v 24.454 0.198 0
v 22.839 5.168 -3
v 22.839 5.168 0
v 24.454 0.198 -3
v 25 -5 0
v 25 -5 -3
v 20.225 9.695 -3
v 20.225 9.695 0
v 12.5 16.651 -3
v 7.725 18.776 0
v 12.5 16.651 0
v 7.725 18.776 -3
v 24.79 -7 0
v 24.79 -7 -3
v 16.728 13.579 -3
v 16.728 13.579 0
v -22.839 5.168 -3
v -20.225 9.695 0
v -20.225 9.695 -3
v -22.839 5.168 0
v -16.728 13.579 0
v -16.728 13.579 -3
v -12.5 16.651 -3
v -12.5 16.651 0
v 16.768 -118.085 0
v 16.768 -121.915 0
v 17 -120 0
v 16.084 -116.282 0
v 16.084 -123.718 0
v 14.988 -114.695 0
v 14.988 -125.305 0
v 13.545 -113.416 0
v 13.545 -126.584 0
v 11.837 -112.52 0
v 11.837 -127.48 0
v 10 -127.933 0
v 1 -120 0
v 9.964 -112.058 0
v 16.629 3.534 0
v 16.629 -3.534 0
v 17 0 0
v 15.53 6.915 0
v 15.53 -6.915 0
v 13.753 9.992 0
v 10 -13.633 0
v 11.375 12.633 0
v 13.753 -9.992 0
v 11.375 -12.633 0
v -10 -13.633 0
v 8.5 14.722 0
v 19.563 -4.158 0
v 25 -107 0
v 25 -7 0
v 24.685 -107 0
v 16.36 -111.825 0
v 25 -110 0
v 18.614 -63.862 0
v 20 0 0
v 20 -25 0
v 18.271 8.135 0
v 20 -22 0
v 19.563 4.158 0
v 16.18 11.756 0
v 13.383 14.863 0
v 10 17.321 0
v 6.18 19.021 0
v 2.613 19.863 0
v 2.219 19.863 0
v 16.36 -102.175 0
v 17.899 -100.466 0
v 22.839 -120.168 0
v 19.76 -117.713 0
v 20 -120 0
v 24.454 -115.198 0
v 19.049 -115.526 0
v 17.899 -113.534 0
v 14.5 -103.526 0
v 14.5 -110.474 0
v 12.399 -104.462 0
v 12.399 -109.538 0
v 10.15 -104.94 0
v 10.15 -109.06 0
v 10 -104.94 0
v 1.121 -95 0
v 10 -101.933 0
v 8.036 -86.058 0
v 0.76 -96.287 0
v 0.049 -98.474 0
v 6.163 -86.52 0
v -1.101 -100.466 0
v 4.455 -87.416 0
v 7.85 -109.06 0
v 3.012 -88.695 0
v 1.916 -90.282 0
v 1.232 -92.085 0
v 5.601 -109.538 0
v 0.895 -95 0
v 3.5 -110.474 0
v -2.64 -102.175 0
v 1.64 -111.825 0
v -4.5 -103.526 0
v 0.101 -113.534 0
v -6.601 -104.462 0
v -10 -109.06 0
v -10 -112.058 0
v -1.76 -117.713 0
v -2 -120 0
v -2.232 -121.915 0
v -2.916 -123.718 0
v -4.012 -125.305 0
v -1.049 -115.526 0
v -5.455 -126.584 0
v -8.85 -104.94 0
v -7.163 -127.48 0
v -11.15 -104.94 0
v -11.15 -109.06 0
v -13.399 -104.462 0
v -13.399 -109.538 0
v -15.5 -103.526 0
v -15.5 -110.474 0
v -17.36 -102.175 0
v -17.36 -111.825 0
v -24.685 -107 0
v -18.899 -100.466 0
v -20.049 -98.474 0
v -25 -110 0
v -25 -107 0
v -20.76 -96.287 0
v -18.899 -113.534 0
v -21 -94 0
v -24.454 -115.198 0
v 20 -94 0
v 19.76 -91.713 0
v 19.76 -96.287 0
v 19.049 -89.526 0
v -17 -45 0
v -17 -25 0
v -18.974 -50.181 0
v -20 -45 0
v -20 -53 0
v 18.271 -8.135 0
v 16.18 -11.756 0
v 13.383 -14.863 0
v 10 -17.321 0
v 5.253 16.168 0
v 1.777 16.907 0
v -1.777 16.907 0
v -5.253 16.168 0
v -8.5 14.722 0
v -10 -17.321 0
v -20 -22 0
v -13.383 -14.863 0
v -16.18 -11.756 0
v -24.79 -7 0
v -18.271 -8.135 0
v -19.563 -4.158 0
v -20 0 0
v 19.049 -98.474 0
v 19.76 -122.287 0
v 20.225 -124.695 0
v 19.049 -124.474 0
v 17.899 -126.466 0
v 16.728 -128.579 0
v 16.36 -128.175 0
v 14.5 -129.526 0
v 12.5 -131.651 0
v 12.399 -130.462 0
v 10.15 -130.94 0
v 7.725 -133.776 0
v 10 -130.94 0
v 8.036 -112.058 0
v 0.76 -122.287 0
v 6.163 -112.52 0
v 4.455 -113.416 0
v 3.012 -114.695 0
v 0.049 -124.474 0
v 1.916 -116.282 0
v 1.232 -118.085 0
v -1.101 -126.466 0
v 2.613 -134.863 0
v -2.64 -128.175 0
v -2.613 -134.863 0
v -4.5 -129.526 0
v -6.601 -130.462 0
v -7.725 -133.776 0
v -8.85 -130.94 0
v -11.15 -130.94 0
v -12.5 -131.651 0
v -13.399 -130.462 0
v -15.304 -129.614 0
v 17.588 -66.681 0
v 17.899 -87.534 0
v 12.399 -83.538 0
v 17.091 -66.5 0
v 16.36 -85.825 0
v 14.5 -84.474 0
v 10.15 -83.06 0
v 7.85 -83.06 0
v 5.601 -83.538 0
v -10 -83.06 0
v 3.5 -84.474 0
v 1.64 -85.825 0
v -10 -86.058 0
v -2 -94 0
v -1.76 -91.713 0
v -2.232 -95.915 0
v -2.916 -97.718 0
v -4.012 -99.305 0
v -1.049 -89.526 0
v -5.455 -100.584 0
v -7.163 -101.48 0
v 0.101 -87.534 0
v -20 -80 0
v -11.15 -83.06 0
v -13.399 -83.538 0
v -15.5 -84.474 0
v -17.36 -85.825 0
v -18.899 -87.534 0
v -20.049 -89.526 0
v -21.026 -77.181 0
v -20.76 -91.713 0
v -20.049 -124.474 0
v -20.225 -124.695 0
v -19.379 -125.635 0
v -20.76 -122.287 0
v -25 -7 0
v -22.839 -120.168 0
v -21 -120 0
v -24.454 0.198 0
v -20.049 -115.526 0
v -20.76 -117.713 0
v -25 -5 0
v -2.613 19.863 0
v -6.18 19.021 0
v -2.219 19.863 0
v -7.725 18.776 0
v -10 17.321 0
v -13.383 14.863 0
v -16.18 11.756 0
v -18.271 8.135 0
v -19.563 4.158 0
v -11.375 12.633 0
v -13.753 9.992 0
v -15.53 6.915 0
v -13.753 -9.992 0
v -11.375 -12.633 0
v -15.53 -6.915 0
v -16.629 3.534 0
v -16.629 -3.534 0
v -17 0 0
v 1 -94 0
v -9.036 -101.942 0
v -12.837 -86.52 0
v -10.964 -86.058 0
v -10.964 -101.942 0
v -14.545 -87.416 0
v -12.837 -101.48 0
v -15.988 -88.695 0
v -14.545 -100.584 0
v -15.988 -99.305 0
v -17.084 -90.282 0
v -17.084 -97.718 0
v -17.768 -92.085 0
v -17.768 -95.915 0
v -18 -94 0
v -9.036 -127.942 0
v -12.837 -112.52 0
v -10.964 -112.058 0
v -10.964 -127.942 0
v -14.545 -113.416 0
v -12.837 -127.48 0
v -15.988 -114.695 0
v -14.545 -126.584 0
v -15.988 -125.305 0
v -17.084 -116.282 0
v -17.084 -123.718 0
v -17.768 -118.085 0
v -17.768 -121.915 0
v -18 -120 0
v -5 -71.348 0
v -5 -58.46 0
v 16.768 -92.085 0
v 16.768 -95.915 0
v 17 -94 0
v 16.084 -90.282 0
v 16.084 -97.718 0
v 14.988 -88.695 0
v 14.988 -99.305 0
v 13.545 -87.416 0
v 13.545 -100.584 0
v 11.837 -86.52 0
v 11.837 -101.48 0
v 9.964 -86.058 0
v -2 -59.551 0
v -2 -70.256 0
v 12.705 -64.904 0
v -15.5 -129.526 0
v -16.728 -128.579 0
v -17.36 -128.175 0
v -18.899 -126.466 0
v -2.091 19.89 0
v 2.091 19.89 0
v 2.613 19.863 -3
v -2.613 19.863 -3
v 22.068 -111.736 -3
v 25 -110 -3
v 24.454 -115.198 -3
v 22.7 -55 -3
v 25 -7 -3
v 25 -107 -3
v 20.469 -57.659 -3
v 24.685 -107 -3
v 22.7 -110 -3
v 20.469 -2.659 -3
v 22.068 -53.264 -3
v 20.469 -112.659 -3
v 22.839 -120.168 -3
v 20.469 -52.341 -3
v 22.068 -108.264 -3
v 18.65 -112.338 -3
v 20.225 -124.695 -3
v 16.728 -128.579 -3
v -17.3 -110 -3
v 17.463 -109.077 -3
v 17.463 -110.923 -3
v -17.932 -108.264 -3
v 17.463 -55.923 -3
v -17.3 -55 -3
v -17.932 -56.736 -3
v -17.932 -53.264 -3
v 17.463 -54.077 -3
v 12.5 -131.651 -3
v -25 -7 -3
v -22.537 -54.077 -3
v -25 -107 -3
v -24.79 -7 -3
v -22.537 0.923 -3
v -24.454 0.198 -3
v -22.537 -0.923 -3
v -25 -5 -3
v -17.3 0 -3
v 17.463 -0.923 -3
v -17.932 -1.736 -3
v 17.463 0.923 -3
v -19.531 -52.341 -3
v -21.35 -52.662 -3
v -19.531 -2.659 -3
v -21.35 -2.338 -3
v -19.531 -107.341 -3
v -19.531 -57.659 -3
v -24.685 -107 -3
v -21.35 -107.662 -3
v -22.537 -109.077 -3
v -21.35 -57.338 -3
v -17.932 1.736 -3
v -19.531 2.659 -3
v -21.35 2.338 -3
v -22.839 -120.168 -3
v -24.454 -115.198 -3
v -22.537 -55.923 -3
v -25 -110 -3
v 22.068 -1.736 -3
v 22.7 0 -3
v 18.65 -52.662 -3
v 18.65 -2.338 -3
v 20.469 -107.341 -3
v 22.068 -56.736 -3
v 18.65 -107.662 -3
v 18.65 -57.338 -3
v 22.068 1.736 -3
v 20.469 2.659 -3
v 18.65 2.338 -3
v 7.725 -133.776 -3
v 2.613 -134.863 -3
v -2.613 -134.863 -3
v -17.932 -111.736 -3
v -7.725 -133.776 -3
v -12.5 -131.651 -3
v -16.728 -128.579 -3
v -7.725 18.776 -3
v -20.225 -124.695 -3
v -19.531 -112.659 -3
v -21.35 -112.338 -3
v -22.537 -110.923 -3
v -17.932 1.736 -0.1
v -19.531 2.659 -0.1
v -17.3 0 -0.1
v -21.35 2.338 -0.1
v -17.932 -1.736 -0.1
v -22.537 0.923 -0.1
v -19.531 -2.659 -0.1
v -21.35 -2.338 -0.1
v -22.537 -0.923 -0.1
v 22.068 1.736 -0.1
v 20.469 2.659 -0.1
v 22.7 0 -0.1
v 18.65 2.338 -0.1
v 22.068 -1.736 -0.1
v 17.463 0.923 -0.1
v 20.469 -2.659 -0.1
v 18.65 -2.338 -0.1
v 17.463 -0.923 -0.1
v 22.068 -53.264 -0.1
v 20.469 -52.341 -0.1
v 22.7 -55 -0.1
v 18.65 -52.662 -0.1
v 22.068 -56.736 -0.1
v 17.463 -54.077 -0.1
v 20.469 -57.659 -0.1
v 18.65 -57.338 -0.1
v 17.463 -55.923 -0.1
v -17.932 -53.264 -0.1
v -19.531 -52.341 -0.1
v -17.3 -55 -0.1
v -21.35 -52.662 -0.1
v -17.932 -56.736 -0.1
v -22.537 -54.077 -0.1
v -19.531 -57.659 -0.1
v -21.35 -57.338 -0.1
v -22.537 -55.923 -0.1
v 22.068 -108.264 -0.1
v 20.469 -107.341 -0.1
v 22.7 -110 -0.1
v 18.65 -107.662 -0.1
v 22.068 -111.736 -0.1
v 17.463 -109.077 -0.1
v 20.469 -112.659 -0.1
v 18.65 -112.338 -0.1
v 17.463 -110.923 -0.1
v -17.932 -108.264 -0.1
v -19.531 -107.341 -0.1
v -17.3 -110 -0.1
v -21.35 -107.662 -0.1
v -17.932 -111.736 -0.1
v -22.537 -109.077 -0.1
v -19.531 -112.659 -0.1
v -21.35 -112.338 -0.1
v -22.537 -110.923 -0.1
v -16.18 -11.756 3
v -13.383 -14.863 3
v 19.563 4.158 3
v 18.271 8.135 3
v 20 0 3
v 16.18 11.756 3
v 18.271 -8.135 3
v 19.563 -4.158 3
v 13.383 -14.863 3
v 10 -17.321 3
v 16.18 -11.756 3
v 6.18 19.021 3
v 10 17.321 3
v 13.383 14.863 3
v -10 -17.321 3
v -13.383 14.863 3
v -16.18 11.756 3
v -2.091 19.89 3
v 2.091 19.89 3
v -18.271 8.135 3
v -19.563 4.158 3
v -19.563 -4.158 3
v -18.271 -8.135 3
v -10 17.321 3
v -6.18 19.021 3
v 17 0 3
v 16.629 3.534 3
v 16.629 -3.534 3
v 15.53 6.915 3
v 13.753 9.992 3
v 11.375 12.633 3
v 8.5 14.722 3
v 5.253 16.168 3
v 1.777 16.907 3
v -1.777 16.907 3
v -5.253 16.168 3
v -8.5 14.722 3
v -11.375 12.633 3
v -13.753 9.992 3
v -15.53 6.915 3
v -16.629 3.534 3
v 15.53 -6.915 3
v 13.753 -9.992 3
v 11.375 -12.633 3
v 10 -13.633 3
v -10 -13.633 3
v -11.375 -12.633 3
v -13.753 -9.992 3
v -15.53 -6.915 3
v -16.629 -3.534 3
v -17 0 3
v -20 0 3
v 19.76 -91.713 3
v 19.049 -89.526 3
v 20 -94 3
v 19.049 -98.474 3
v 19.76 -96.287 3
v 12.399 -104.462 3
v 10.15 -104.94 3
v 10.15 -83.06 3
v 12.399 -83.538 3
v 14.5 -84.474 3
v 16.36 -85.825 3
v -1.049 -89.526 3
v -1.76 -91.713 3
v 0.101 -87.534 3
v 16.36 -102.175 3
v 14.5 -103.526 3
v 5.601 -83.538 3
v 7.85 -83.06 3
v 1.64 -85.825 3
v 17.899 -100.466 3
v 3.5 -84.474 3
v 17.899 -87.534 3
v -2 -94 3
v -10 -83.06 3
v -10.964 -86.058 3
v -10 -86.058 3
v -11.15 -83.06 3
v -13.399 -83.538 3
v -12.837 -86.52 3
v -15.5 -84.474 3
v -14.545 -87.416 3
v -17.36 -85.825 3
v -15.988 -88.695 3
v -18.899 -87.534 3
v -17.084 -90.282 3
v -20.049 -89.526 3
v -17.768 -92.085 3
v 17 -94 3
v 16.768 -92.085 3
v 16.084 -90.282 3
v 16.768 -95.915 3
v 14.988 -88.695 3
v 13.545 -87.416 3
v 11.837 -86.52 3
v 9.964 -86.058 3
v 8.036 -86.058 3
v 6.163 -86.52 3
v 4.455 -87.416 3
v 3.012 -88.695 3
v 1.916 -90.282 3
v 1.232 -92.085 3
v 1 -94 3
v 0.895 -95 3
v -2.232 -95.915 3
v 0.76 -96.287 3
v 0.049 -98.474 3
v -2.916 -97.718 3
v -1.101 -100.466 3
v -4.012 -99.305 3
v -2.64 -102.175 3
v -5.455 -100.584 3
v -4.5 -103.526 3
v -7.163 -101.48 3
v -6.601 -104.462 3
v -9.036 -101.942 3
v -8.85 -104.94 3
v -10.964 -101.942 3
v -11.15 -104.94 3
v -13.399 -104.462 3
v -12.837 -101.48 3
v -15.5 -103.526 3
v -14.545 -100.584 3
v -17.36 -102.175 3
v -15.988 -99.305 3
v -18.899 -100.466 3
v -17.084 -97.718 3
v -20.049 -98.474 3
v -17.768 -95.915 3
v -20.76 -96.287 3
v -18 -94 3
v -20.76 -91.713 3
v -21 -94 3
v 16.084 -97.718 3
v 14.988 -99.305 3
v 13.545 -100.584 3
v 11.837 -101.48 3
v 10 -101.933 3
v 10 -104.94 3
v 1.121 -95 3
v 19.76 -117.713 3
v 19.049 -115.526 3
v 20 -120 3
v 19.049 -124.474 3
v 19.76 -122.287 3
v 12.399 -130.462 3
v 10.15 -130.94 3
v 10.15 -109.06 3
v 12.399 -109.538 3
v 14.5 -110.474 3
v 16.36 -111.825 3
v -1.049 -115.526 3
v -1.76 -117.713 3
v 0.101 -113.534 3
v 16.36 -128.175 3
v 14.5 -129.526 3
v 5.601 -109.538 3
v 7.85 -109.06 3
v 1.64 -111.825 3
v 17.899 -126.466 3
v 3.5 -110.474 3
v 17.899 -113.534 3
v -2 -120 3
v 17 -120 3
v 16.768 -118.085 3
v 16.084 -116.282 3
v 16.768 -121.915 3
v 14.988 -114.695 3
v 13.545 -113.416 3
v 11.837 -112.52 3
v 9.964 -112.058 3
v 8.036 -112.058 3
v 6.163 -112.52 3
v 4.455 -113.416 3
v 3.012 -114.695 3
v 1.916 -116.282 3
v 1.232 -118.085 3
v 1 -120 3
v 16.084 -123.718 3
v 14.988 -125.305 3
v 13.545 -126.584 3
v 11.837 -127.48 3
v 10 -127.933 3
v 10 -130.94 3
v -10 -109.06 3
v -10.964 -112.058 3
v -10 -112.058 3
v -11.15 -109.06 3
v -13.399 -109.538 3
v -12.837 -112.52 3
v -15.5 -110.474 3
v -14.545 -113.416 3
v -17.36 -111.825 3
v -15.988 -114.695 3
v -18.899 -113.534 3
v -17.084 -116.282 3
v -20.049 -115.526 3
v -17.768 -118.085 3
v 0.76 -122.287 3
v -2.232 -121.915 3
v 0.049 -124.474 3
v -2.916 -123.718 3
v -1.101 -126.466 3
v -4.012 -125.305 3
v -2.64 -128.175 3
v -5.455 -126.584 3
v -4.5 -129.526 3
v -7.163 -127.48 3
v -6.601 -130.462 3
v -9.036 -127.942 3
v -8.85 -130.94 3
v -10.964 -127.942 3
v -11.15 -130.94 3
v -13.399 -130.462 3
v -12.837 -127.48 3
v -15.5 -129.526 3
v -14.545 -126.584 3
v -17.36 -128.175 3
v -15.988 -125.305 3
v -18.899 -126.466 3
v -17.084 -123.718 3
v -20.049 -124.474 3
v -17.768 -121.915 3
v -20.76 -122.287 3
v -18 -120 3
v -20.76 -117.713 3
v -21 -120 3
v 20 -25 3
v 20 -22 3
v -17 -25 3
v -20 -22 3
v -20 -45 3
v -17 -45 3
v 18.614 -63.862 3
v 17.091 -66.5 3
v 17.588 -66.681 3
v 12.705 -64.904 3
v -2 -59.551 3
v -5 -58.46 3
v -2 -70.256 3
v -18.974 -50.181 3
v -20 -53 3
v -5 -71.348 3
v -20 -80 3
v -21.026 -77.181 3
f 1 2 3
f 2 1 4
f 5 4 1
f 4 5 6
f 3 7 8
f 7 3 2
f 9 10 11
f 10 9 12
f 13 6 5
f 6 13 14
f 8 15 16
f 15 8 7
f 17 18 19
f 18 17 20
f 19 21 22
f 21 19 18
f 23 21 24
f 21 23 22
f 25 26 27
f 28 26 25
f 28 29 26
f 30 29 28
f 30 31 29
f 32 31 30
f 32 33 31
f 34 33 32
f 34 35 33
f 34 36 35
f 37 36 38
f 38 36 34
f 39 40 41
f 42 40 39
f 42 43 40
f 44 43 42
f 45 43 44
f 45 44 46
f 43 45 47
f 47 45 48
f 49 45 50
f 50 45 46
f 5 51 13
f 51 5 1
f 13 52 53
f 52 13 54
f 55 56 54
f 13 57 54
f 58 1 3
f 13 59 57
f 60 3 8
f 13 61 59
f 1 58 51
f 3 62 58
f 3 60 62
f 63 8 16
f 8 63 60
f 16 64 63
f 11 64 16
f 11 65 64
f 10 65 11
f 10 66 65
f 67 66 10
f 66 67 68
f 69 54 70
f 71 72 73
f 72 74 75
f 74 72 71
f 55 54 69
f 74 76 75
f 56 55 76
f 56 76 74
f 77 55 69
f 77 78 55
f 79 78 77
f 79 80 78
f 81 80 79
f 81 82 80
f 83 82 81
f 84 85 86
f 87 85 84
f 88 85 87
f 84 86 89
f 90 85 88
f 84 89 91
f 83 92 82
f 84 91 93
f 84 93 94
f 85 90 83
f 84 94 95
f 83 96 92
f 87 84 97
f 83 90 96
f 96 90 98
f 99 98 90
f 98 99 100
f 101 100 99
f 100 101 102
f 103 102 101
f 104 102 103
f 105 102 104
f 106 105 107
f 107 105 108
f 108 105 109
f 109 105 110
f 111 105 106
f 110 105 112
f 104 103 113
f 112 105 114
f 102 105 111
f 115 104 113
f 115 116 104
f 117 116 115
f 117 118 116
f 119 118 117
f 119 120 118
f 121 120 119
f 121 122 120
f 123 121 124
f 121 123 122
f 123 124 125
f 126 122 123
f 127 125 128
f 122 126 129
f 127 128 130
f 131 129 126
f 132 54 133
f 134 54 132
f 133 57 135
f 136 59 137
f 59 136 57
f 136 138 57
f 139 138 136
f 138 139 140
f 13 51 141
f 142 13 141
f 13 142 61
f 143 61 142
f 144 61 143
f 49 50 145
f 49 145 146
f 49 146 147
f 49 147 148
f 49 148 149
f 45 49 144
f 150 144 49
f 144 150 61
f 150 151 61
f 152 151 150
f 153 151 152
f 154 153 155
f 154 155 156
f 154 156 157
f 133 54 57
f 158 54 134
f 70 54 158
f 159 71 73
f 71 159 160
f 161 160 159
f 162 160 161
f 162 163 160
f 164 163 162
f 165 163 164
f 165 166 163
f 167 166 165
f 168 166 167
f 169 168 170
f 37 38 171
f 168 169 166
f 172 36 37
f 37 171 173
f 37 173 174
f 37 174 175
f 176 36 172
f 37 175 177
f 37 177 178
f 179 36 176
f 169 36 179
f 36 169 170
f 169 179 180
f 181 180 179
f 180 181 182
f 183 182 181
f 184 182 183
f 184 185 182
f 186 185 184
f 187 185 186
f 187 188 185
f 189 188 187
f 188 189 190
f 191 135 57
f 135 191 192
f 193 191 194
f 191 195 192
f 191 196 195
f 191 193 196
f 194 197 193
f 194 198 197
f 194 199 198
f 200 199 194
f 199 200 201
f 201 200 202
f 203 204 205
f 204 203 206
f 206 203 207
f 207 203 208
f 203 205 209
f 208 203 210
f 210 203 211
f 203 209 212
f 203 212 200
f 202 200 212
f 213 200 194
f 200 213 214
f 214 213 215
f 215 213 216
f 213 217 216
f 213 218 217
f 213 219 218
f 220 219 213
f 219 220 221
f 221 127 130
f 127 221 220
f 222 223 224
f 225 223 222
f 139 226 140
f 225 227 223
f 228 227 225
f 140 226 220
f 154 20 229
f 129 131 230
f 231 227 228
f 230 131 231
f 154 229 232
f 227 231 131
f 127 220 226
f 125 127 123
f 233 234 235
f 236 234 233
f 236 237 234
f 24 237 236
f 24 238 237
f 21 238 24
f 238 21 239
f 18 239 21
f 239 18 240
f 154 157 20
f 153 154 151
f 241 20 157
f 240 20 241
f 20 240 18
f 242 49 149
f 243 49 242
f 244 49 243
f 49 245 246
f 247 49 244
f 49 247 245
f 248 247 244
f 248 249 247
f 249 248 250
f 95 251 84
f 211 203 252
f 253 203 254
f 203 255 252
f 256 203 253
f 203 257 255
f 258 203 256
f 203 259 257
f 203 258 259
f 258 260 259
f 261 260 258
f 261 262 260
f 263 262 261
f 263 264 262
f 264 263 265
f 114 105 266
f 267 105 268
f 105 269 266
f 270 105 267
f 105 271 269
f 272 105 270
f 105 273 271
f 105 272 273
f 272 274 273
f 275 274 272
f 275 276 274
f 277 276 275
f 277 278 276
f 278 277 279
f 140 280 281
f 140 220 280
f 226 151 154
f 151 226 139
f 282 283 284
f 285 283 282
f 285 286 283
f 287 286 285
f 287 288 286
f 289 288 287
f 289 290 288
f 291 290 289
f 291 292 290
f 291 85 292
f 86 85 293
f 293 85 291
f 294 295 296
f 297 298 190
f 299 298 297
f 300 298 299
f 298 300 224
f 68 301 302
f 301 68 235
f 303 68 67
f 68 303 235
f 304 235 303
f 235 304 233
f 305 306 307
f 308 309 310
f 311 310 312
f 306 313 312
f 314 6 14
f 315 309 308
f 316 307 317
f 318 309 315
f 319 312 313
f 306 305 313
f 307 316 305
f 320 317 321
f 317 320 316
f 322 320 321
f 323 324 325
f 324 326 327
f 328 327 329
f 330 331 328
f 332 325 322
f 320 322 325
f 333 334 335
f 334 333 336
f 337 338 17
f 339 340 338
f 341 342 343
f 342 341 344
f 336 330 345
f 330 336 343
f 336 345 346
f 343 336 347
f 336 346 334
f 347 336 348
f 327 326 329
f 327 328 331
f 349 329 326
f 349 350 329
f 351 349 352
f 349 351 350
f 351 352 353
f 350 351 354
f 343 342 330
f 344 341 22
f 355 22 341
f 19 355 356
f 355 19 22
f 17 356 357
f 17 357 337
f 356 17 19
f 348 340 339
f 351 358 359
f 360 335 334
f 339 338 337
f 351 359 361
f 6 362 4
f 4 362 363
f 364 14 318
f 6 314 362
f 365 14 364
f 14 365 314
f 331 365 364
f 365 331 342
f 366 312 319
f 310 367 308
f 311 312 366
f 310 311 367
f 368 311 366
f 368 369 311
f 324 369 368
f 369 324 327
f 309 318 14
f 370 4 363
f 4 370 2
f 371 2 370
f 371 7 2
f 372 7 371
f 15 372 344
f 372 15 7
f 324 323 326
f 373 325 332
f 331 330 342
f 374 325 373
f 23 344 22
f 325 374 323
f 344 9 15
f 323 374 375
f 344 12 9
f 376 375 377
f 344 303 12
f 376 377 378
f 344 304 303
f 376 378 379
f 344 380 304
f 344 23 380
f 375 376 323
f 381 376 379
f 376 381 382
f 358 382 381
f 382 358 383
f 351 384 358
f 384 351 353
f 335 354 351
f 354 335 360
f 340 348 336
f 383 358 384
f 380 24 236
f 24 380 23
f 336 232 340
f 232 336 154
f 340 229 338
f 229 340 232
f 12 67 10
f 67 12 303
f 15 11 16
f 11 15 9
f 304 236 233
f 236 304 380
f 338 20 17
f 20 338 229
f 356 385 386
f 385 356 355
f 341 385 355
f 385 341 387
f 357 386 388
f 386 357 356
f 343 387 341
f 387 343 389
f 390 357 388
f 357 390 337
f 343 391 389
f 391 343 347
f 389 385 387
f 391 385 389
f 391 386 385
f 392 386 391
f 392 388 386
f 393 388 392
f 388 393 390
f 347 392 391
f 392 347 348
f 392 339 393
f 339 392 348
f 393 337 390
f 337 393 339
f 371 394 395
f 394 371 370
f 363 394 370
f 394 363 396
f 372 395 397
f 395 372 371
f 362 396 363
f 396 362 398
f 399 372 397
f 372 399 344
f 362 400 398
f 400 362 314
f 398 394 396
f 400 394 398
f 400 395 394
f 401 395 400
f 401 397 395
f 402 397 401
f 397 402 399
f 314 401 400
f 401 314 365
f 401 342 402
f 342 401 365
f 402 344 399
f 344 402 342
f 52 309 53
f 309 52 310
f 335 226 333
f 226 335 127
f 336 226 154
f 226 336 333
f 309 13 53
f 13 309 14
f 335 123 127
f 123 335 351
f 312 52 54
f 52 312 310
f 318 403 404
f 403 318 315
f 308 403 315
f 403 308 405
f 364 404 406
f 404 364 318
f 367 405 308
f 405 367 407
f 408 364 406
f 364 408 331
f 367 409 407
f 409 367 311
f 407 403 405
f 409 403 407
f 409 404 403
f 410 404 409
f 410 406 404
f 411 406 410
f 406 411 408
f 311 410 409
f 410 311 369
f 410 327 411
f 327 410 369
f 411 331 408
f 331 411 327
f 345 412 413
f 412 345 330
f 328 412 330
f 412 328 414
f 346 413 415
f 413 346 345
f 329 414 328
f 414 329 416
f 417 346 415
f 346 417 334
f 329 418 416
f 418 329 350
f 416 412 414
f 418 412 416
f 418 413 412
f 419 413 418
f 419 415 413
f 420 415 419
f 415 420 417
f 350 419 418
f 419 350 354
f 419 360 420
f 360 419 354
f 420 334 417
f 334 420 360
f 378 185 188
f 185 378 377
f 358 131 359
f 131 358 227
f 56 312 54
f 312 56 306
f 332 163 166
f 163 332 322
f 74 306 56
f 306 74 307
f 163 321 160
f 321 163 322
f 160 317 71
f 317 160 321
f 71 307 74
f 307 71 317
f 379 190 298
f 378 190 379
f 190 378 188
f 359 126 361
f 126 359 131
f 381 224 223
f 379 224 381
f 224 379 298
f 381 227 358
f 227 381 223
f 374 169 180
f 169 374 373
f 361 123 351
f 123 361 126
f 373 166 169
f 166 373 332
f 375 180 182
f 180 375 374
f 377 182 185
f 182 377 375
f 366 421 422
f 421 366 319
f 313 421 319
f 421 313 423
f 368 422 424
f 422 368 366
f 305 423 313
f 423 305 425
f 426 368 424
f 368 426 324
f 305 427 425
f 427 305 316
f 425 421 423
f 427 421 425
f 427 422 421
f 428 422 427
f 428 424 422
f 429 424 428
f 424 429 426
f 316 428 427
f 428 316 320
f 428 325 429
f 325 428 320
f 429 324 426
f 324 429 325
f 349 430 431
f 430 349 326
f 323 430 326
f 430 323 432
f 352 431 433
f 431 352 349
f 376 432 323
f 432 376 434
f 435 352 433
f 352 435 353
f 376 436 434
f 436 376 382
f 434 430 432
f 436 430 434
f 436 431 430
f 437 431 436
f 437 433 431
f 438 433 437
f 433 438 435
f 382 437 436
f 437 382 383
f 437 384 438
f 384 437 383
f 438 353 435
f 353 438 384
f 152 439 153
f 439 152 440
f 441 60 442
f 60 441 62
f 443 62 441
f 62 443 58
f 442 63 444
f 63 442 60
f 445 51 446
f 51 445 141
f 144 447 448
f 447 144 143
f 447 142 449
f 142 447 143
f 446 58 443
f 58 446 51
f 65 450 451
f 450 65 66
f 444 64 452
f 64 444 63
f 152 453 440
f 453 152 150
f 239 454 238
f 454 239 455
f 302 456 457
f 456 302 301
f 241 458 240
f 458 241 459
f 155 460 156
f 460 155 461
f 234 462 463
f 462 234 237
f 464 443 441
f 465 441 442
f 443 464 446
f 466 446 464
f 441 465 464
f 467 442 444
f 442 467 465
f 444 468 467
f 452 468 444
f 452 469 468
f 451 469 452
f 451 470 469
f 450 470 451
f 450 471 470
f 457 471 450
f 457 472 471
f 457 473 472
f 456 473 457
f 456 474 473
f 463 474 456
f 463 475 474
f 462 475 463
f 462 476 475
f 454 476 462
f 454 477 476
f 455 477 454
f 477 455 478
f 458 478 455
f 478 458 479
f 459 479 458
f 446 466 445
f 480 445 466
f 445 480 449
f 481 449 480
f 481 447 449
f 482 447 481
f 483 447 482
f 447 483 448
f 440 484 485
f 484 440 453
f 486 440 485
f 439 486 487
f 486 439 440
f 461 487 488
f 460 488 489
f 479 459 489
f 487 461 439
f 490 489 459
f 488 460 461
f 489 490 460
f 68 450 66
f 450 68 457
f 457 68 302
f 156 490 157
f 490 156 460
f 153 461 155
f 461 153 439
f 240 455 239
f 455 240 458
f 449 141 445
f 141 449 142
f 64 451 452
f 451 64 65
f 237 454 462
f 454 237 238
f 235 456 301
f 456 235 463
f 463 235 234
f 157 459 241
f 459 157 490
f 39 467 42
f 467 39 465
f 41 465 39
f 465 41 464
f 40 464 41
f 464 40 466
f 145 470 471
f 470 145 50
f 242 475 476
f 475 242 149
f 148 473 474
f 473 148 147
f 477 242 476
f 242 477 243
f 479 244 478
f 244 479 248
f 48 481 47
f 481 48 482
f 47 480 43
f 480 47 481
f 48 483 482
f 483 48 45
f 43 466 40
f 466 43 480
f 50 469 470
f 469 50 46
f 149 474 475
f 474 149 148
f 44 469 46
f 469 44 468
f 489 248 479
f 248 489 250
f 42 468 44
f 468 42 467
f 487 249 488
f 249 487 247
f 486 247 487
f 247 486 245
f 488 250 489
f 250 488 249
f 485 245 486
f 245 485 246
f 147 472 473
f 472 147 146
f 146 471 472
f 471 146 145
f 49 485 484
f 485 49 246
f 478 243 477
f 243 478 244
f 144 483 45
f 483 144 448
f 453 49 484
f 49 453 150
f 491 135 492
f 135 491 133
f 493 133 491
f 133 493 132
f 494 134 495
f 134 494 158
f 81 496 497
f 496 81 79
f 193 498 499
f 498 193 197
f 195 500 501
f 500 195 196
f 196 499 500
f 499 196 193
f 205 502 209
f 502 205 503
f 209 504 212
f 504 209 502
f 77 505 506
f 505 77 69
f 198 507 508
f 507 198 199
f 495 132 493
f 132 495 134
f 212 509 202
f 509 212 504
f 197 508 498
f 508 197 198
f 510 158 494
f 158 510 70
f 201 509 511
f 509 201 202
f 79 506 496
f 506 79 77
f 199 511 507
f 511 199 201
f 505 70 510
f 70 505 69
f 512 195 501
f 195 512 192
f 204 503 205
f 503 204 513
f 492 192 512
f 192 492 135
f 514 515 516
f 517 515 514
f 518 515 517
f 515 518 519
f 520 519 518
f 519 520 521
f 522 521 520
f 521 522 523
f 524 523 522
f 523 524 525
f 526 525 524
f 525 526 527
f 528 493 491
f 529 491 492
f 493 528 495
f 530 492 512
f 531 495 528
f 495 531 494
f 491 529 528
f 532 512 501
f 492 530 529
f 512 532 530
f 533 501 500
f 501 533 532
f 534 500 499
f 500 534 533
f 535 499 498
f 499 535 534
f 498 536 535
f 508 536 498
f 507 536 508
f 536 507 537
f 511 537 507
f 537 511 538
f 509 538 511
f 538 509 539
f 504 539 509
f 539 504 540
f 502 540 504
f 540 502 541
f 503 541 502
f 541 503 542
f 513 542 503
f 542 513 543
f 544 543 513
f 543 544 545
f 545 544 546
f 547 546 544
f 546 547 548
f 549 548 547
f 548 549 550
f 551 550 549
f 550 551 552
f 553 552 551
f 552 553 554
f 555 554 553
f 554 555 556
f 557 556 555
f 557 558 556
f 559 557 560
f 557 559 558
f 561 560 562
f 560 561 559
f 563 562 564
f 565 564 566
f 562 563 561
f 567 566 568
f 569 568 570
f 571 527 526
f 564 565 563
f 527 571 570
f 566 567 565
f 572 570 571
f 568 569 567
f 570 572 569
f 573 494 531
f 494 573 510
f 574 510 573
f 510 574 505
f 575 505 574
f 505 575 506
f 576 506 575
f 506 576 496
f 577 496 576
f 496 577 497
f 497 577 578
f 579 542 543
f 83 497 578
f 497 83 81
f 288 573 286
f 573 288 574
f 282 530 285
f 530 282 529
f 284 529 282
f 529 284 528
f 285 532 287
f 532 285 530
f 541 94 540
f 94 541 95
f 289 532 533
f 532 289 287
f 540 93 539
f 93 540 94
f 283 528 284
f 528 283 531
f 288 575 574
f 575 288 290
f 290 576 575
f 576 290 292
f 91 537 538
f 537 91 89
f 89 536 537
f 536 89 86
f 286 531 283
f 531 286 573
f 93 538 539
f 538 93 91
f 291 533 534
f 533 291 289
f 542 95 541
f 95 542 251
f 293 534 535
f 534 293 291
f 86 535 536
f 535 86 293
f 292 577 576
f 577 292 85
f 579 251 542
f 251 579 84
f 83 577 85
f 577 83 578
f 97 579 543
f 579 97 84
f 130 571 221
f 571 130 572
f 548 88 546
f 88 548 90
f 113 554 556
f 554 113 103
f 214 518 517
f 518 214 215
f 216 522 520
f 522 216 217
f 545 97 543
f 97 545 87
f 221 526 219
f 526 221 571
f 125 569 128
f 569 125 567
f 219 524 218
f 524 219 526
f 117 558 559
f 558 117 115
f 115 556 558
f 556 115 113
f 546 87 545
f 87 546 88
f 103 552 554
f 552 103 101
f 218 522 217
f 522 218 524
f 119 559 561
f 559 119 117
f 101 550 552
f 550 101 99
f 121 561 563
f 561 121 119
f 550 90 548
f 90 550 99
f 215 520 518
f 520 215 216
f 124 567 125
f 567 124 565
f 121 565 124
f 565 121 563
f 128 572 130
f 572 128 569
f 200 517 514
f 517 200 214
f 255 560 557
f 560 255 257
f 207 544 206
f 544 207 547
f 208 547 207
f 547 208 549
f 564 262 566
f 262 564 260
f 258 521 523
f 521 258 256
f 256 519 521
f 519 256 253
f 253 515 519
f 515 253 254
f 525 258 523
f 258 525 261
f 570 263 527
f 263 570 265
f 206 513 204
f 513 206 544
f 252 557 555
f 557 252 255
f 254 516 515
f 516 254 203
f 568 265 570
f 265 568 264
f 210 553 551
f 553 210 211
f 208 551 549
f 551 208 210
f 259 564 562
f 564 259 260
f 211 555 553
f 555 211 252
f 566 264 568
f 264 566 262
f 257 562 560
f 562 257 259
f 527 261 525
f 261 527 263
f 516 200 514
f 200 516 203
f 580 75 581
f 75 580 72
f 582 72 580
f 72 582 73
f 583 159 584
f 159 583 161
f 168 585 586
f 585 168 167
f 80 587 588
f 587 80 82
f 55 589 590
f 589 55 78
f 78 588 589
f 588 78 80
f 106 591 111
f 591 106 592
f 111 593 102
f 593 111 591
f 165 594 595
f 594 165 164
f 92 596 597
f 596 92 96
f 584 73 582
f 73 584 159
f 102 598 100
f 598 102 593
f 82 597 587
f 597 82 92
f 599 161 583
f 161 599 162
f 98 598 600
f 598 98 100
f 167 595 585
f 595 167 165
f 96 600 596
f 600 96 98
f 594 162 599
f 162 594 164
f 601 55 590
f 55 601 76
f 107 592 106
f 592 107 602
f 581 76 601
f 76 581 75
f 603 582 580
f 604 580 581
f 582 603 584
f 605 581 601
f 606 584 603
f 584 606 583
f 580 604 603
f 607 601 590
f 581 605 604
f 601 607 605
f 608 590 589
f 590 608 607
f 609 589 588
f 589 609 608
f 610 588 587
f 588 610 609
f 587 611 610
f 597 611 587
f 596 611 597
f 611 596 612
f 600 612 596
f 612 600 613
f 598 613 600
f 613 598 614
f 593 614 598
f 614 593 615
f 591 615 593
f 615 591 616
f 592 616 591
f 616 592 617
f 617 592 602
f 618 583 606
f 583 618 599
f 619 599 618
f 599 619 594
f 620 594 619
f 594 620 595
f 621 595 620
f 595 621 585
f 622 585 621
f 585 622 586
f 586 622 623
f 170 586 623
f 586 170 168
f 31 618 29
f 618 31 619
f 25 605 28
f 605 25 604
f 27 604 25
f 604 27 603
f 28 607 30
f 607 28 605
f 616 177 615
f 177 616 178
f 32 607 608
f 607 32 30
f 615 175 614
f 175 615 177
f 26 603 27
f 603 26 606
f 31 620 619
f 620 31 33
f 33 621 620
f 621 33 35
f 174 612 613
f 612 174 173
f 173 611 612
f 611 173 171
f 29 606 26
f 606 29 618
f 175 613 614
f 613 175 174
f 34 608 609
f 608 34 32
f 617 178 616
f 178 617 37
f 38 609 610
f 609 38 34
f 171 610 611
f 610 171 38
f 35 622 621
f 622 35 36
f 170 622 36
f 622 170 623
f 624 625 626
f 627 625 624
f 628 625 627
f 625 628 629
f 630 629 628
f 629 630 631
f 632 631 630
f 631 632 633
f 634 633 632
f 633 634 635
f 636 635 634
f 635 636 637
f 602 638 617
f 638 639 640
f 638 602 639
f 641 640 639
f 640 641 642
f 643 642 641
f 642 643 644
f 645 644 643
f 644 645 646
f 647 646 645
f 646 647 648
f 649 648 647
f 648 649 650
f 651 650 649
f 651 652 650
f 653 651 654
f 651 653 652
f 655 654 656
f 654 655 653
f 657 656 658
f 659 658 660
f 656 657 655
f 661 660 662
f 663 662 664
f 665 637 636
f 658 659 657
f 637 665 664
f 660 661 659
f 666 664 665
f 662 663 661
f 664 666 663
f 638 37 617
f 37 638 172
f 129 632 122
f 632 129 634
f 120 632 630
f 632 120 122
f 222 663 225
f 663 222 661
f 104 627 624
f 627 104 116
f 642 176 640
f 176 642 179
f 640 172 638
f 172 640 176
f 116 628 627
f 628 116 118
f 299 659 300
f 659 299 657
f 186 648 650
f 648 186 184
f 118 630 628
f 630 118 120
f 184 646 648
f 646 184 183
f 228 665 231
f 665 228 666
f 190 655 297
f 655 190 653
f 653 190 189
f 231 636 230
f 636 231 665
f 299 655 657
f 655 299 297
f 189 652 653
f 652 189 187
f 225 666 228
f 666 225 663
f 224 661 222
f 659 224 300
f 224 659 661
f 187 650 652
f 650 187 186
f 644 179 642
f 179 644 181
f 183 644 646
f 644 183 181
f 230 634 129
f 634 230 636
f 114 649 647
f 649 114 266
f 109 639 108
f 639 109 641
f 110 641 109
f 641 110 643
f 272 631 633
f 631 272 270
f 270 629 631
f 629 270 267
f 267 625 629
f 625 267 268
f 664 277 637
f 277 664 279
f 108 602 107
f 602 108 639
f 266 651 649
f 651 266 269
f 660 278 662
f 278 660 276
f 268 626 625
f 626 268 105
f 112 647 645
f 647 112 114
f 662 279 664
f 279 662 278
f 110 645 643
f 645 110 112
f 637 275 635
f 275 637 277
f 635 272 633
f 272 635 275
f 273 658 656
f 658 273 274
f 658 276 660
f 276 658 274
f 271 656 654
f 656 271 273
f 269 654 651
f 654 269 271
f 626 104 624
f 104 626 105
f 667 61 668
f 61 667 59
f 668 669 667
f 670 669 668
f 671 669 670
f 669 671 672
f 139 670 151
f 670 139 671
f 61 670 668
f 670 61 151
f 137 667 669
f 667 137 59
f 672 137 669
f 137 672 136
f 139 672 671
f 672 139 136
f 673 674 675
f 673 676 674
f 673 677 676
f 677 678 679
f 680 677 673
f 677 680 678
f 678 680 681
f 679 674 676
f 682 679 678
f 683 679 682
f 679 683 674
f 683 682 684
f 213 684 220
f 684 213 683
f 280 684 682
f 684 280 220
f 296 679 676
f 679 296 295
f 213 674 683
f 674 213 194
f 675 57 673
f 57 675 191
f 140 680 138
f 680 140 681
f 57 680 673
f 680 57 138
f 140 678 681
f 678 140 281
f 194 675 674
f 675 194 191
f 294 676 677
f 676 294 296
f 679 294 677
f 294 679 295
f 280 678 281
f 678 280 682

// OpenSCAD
union(){
//основа
difference(){
  translate([0,-5,-3]) cylinder(3,25,25);
  translate([-20,0,-3]) cylinder(2.9,2.7,2.7);
  translate([20,0,-3]) cylinder(2.9,2.7,2.7);


}
difference(){
  translate([-25,-107,-3]) cube([50,100,3]);
  translate([20,-55,-3]) cylinder(2.9,2.7,2.7);
  translate([-20,-55,-3]) cylinder(2.9,2.7,2.7);



}
difference(){
  translate([0,-110,-3]) cylinder(3,25,25);
  translate([20,-110,-3]) cylinder(2.9,2.7,2.7);
  translate([-20,-110,-3]) cylinder(2.9,2.7,2.7);
}








//буква С
difference(){
  cylinder(3,20,20);
  cylinder(3,17,17);
  translate([-10,-20,0]) cube(20);
}
//буква L
  translate([-20,-25,0]) cube([40,3,3]);
  translate([-20,-45,0]) cube([3,20,3]);
//буква А
 translate([-20,-80,0])
  rotate(20,0,0)
   cube([40,3,3]);
 
 translate([-20,-53,0])
  rotate(-20,0,0)
   cube([40,3,3]);

  translate([-5,-73,0]) cube([3,16,3]);

//буква S

difference(){
  translate([9,-94,0]) cylinder(3,11,11);
  translate([9,-94,0]) cylinder(3,8,8);
  translate([-5,-110,0]) cube(15);

}

difference(){
  translate([-10,-94,0]) cylinder(3,11,11);
  translate([-10,-94,0]) cylinder(3,8,8);
  translate([-10,-94,0]) cube(15);

}
difference(){
  translate([9,-120,0]) cylinder(3,11,11);
  translate([9,-120,0]) cylinder(3,8,8);
  translate([-5,-135,0]) cube(15);

}

difference(){
  translate([-10,-120,0]) cylinder(3,11,11);
  translate([-10,-120,0]) cylinder(3,8,8);
  translate([-10,-120,0]) cube(15);

}
}
